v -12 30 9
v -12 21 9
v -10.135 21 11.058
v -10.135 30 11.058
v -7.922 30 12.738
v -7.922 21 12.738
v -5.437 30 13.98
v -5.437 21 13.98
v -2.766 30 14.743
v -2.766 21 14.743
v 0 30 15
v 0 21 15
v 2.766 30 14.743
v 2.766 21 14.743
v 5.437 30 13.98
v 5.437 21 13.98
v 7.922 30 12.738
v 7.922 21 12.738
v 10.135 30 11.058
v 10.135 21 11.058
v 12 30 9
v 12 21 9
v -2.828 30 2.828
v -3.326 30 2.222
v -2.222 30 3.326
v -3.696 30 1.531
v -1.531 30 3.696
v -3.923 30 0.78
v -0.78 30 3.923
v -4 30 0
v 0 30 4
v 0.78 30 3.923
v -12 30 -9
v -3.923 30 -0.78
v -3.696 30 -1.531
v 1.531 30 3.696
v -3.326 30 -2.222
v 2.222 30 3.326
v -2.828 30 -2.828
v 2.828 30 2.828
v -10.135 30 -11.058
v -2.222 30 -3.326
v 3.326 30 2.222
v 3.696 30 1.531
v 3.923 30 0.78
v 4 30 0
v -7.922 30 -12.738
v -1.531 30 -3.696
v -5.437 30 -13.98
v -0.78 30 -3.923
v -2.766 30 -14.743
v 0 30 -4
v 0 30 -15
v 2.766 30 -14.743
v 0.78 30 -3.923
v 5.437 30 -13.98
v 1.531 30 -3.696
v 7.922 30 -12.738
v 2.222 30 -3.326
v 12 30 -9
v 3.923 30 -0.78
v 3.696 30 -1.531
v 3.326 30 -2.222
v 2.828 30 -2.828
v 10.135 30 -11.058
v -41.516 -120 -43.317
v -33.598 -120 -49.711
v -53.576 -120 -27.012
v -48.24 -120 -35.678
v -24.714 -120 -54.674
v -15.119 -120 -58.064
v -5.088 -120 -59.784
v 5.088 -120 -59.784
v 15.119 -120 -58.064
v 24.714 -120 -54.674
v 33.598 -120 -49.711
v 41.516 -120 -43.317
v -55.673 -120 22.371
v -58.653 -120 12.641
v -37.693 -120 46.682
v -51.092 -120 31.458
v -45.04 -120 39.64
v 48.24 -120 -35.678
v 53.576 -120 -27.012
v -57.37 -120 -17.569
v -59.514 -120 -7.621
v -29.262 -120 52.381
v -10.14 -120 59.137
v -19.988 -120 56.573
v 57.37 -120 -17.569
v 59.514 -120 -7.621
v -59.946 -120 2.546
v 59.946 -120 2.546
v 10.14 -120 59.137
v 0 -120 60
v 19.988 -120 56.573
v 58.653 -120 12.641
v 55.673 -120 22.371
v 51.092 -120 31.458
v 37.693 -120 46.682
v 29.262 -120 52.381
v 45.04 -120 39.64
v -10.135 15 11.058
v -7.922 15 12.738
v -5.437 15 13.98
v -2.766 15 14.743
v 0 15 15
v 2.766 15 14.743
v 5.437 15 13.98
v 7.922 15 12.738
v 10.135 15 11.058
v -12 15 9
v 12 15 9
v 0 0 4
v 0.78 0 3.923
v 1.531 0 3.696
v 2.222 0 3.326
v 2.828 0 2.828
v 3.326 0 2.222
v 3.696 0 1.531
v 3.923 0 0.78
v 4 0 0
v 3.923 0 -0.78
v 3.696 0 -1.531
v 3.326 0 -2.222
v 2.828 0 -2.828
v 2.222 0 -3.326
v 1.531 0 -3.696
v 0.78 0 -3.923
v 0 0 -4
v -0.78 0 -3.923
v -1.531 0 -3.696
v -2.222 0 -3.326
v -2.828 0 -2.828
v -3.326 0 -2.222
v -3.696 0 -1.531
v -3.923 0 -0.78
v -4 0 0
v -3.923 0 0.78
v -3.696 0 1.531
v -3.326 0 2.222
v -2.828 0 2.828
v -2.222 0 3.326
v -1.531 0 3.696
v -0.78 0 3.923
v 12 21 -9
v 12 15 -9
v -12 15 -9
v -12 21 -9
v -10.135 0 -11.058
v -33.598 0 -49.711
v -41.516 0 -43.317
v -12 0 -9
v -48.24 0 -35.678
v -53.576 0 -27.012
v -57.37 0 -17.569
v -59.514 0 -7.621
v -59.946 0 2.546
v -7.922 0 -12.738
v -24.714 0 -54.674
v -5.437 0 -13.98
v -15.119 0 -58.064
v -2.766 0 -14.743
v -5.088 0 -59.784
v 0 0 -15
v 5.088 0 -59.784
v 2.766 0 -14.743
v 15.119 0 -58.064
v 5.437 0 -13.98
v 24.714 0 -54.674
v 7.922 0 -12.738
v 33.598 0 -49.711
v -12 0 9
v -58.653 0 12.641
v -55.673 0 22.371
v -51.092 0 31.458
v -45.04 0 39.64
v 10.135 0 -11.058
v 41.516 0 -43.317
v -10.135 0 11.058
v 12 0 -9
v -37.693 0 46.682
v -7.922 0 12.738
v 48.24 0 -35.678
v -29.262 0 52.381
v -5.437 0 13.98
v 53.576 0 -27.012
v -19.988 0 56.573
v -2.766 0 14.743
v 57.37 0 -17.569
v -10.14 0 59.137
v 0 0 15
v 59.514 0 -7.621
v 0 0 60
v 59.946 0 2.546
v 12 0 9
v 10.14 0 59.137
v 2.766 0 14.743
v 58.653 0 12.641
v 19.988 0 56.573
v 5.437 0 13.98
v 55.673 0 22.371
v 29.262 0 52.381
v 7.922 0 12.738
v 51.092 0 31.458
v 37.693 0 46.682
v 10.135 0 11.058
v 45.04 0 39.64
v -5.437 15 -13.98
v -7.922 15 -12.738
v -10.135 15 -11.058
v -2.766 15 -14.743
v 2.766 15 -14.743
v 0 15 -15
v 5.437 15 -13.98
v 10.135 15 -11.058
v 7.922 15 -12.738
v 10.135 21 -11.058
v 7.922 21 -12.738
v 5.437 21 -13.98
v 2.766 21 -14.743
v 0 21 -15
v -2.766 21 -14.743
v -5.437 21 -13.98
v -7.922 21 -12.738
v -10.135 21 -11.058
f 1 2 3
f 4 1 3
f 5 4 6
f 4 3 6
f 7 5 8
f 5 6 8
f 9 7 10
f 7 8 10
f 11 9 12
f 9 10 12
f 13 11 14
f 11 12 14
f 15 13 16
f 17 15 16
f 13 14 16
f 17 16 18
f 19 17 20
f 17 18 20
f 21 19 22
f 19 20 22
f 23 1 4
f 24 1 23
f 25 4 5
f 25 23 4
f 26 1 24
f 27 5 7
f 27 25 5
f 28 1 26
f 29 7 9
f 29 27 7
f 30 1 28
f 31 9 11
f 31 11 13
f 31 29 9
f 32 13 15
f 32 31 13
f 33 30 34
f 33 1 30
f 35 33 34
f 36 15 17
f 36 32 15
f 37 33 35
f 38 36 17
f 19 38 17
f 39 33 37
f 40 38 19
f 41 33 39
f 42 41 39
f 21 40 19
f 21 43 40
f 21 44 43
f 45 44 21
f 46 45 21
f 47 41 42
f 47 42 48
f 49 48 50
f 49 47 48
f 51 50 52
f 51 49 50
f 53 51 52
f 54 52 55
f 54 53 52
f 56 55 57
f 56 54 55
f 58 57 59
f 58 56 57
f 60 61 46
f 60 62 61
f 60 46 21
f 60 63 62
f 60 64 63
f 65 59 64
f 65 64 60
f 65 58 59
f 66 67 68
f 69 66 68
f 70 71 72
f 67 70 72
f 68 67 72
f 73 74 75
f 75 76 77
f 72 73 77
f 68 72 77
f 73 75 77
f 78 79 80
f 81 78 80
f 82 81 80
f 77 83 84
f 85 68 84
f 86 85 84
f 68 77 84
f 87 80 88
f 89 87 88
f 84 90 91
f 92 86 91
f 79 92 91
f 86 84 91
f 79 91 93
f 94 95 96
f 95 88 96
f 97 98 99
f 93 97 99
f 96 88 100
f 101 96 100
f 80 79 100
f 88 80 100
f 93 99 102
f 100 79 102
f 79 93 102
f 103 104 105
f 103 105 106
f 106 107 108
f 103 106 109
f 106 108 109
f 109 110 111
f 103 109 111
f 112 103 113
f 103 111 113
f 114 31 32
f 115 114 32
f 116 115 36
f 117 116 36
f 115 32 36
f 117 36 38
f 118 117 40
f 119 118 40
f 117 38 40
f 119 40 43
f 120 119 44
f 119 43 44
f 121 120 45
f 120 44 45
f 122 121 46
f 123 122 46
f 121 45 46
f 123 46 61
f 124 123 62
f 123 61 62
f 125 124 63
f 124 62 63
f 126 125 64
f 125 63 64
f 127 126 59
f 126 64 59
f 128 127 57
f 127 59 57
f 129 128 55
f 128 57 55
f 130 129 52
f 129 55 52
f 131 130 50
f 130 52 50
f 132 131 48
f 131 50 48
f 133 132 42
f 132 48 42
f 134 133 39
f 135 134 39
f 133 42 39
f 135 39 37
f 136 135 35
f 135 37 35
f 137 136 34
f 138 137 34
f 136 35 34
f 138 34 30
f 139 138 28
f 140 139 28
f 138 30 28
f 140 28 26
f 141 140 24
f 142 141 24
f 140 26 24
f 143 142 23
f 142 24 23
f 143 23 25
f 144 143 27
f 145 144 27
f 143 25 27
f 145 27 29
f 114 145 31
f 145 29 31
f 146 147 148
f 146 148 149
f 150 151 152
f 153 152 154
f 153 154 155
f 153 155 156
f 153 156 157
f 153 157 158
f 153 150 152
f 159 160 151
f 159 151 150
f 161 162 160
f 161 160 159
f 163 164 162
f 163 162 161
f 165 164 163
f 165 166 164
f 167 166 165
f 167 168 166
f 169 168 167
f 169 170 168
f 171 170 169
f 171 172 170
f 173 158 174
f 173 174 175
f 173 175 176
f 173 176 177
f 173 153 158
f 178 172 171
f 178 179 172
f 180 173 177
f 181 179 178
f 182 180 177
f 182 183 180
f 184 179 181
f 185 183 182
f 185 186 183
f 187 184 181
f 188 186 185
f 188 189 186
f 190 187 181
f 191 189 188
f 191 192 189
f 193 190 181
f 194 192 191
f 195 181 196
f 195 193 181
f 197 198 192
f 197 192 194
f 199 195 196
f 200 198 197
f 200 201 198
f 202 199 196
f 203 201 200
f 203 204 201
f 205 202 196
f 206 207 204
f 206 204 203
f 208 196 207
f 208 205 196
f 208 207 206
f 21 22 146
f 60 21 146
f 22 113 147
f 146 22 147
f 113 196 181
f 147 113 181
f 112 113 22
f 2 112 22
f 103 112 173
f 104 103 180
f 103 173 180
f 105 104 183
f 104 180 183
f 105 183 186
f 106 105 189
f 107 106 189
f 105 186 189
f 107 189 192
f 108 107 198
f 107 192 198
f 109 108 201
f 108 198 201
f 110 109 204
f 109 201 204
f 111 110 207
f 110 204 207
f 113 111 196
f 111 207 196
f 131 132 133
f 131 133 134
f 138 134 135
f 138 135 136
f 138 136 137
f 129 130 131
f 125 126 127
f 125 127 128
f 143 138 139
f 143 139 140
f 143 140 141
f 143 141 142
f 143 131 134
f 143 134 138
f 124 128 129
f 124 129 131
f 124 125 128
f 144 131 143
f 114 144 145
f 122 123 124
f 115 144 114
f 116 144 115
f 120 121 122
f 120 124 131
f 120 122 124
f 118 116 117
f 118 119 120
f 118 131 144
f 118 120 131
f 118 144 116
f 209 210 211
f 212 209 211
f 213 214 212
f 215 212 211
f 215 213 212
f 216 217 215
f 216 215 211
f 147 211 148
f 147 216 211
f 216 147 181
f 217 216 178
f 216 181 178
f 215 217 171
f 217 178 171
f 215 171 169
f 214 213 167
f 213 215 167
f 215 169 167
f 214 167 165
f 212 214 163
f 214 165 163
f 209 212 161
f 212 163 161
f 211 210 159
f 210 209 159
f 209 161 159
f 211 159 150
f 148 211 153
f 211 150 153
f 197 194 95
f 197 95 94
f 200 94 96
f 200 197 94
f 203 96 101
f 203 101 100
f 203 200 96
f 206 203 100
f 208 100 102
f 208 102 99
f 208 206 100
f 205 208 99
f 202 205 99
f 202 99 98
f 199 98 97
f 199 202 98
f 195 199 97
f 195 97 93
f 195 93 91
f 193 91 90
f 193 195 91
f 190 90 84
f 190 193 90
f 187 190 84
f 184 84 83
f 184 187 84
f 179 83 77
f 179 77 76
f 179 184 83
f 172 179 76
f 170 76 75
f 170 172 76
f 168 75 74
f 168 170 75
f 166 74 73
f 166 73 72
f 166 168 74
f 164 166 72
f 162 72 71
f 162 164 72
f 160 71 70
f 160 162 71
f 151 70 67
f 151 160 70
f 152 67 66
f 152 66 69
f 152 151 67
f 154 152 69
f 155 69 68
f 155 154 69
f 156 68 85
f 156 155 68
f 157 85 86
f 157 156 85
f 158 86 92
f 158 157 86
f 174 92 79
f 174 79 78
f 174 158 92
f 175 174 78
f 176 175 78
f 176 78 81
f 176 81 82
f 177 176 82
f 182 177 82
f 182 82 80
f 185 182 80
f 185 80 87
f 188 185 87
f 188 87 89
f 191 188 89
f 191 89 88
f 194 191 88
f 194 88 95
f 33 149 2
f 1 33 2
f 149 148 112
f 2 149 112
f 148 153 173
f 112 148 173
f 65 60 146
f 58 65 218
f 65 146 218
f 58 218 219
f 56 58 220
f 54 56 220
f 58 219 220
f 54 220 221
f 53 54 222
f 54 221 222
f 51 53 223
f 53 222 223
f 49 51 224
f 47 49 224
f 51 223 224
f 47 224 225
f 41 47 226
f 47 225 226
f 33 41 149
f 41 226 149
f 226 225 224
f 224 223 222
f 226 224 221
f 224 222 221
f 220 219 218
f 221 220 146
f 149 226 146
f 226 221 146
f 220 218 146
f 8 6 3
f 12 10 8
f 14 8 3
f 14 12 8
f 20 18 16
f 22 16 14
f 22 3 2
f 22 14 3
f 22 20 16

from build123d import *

# Parameters (mm, degrees)
SKETCH1_R           = 60
BOSS_EXTRUDE1_DEPTH = 120
BOSS_EXTRUDE2_DEPTH = 30
CUT_EXTRUDE1_REACH  = 154.263
SKETCH3_W           = 6
SKETCH3_H           = 6
SKETCH4_R           = 4
CUT_EXTRUDE2_DEPTH  = 30


with BuildPart() as part:
    # Sketch1 → Boss-Extrude1 (new body)
    with BuildSketch(Plane(origin=(0, 0, 0), x_dir=(1, 0, 0), z_dir=(0, 1, 0))):
        with Locations(Location((0, 0, 0), (0, 0, 270))):
            Circle(SKETCH1_R)
    extrude(amount=-BOSS_EXTRUDE1_DEPTH)

    # Sketch2 → Boss-Extrude2 (add)
    with BuildSketch(Plane(origin=(0, 0, 0), x_dir=(1, 0, 0), z_dir=(0, 1, 0))):
        with BuildLine():
            Line((-12, 9), (-12, -9))
            ThreePointArc((-12, -9), (0, -15), (12, -9))
            Line((12, -9), (12, 9))
            ThreePointArc((12, 9), (0, 15), (-12, 9))
        make_face()
    extrude(amount=BOSS_EXTRUDE2_DEPTH)

    # Sketch3 → Cut-Extrude1 (cut, up to next)
    with BuildSketch(Plane(origin=(12, 0, 0), x_dir=(0, 0, -1), z_dir=(1, 0, 0)), mode=Mode.PRIVATE) as cut_extrude1_sk1:
        with Locations((-12, 18)):
            Rectangle(SKETCH3_W, SKETCH3_H)
    cut_extrude1_tool1 = extrude(cut_extrude1_sk1.sketch, amount=-CUT_EXTRUDE1_REACH, mode=Mode.PRIVATE) & part.part
    cut_extrude1 = cut_extrude1_tool1.solids().sort_by_distance((12, 18, 12))[0]
    add(cut_extrude1, mode=Mode.SUBTRACT)

    # Mirror1: Cut-Extrude1 across plane
    add(cut_extrude1.mirror(Plane.XY), mode=Mode.SUBTRACT)

    # Sketch4 → Cut-Extrude2 (cut)
    with BuildSketch(Plane(origin=(0, 30, 0), x_dir=(1, 0, 0), z_dir=(0, 1, 0))):
        with Locations(Location((0, 0, 0), (0, 0, 270))):
            Circle(SKETCH4_R)
    extrude(amount=-CUT_EXTRUDE2_DEPTH, mode=Mode.SUBTRACT)


solid = part.part
